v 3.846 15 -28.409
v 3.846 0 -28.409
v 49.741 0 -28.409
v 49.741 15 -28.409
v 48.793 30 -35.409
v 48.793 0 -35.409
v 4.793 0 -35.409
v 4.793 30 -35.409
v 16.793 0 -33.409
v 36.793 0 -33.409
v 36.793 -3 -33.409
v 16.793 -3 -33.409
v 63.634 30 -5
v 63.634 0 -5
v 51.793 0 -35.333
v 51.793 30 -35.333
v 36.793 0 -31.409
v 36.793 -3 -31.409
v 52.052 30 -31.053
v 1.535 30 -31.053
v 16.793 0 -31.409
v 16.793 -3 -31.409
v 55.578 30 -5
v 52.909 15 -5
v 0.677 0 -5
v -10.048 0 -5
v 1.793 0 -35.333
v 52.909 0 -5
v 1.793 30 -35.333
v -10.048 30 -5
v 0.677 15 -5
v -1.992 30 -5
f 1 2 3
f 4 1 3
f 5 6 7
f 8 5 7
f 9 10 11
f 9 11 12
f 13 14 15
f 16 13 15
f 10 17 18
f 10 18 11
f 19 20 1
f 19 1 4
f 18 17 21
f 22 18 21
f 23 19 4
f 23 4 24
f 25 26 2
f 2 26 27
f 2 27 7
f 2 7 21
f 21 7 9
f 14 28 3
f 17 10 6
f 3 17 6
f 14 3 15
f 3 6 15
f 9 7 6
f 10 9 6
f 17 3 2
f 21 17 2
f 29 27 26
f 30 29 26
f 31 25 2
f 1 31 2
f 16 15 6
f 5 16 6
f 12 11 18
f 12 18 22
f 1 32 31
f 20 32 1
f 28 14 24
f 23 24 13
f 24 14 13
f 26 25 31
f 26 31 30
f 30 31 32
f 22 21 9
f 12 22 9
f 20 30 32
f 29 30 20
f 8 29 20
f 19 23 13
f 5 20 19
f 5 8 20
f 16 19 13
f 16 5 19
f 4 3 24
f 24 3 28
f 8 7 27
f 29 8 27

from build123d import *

# Parameters (mm, degrees)
SALIENTE_EXTRUIR1_DEPTH = 30
CORTAR_EXTRUIR2_DEPTH   = 90
CROQUIS5_W              = 20
CROQUIS5_H              = 2
SALIENTE_EXTRUIR2_DEPTH = 3
CHAFL_N1_SIZE           = 15
CHAFL_N1_SIZE2          = 2.644904711
CHAFL_N1_PART_2_SIZE    = 15
CHAFL_N1_PART_2_SIZE2   = 2.644904711
CHAFL_N1_PART_3_SIZE    = 15
CHAFL_N1_PART_3_SIZE2   = 2.644904711


with BuildPart() as part:
    # Croquis2 → Saliente-Extruir1 (new body)
    with BuildSketch(Plane(origin=(0, 0, 0), x_dir=(1, 0, 0), z_dir=(0, 1, 0))):
        Polygon((4.793050572, 35.408576274), (1.793050572, 35.33296049), (-12, 0), (0, 0), (3.845501771, 28.408576274), align=None)
        Polygon((48.793050572, 35.408576274), (4.793050572, 35.408576274), (3.845501771, 28.408576274), (49.740599373, 28.408576274), align=None)
        Polygon((51.793050572, 35.33296049), (48.793050572, 35.408576274), (49.740599373, 28.408576274), (53.586101144, 0), (65.586101144, 0), align=None)
    extrude(amount=SALIENTE_EXTRUIR1_DEPTH)

    # Croquis4 → Cortar-Extruir2 (cut, symmetric)
    with BuildSketch(Plane(origin=(0, 0, 0), x_dir=(0, 0, -1), z_dir=(1, 0, 0))):
        Polygon((0, 0), (5, 0), (5, 30), (-4.90661078, 30), (-4.90661078, 0), align=None)
    extrude(amount=CORTAR_EXTRUIR2_DEPTH, both=True, mode=Mode.SUBTRACT)

    # Croquis5 → Saliente-Extruir2 (add)
    with BuildSketch(Plane(origin=(0, 0, 0), x_dir=(-1, 0, 0), z_dir=(0, -1, 0))):
        with Locations((-26.793050572, 32.408576274)):
            Rectangle(CROQUIS5_W, CROQUIS5_H)
    extrude(amount=SALIENTE_EXTRUIR2_DEPTH)

    # Chaflán1
    chafl_n1_edges = [part.edges().sort_by_distance(p)[0] for p in [
        (26.793050572, 30, -28.408576274),
    ]]
    chafl_n1_side = [part.faces().sort_by_distance(p)[0] for p in [
        (26.793050572, 15, -28.408576274),
    ]]
    chamfer(chafl_n1_edges, length=CHAFL_N1_SIZE, length2=CHAFL_N1_SIZE2, reference=chafl_n1_side[0])

    # Chaflán1 part 2
    chafl_n1_part_2_edges = [part.edges().sort_by_distance(p)[0] for p in [
        (2.261161172, 30, -16.704288137),
    ]]
    chafl_n1_part_2_side = [part.faces().sort_by_distance(p)[0] for p in [
        (2.261161172, 15, -16.704288137),
    ]]
    chamfer(chafl_n1_part_2_edges, length=CHAFL_N1_PART_2_SIZE, length2=CHAFL_N1_PART_2_SIZE2, reference=chafl_n1_part_2_side[0])

    # Chaflán1 part 3
    chafl_n1_part_3_edges = [part.edges().sort_by_distance(p)[0] for p in [
        (51.324939972, 30, -16.704288137),
    ]]
    chafl_n1_part_3_side = [part.faces().sort_by_distance(p)[0] for p in [
        (51.324939972, 15, -16.704288137),
    ]]
    chamfer(chafl_n1_part_3_edges, length=CHAFL_N1_PART_3_SIZE, length2=CHAFL_N1_PART_3_SIZE2, reference=chafl_n1_part_3_side[0])


solid = part.part
